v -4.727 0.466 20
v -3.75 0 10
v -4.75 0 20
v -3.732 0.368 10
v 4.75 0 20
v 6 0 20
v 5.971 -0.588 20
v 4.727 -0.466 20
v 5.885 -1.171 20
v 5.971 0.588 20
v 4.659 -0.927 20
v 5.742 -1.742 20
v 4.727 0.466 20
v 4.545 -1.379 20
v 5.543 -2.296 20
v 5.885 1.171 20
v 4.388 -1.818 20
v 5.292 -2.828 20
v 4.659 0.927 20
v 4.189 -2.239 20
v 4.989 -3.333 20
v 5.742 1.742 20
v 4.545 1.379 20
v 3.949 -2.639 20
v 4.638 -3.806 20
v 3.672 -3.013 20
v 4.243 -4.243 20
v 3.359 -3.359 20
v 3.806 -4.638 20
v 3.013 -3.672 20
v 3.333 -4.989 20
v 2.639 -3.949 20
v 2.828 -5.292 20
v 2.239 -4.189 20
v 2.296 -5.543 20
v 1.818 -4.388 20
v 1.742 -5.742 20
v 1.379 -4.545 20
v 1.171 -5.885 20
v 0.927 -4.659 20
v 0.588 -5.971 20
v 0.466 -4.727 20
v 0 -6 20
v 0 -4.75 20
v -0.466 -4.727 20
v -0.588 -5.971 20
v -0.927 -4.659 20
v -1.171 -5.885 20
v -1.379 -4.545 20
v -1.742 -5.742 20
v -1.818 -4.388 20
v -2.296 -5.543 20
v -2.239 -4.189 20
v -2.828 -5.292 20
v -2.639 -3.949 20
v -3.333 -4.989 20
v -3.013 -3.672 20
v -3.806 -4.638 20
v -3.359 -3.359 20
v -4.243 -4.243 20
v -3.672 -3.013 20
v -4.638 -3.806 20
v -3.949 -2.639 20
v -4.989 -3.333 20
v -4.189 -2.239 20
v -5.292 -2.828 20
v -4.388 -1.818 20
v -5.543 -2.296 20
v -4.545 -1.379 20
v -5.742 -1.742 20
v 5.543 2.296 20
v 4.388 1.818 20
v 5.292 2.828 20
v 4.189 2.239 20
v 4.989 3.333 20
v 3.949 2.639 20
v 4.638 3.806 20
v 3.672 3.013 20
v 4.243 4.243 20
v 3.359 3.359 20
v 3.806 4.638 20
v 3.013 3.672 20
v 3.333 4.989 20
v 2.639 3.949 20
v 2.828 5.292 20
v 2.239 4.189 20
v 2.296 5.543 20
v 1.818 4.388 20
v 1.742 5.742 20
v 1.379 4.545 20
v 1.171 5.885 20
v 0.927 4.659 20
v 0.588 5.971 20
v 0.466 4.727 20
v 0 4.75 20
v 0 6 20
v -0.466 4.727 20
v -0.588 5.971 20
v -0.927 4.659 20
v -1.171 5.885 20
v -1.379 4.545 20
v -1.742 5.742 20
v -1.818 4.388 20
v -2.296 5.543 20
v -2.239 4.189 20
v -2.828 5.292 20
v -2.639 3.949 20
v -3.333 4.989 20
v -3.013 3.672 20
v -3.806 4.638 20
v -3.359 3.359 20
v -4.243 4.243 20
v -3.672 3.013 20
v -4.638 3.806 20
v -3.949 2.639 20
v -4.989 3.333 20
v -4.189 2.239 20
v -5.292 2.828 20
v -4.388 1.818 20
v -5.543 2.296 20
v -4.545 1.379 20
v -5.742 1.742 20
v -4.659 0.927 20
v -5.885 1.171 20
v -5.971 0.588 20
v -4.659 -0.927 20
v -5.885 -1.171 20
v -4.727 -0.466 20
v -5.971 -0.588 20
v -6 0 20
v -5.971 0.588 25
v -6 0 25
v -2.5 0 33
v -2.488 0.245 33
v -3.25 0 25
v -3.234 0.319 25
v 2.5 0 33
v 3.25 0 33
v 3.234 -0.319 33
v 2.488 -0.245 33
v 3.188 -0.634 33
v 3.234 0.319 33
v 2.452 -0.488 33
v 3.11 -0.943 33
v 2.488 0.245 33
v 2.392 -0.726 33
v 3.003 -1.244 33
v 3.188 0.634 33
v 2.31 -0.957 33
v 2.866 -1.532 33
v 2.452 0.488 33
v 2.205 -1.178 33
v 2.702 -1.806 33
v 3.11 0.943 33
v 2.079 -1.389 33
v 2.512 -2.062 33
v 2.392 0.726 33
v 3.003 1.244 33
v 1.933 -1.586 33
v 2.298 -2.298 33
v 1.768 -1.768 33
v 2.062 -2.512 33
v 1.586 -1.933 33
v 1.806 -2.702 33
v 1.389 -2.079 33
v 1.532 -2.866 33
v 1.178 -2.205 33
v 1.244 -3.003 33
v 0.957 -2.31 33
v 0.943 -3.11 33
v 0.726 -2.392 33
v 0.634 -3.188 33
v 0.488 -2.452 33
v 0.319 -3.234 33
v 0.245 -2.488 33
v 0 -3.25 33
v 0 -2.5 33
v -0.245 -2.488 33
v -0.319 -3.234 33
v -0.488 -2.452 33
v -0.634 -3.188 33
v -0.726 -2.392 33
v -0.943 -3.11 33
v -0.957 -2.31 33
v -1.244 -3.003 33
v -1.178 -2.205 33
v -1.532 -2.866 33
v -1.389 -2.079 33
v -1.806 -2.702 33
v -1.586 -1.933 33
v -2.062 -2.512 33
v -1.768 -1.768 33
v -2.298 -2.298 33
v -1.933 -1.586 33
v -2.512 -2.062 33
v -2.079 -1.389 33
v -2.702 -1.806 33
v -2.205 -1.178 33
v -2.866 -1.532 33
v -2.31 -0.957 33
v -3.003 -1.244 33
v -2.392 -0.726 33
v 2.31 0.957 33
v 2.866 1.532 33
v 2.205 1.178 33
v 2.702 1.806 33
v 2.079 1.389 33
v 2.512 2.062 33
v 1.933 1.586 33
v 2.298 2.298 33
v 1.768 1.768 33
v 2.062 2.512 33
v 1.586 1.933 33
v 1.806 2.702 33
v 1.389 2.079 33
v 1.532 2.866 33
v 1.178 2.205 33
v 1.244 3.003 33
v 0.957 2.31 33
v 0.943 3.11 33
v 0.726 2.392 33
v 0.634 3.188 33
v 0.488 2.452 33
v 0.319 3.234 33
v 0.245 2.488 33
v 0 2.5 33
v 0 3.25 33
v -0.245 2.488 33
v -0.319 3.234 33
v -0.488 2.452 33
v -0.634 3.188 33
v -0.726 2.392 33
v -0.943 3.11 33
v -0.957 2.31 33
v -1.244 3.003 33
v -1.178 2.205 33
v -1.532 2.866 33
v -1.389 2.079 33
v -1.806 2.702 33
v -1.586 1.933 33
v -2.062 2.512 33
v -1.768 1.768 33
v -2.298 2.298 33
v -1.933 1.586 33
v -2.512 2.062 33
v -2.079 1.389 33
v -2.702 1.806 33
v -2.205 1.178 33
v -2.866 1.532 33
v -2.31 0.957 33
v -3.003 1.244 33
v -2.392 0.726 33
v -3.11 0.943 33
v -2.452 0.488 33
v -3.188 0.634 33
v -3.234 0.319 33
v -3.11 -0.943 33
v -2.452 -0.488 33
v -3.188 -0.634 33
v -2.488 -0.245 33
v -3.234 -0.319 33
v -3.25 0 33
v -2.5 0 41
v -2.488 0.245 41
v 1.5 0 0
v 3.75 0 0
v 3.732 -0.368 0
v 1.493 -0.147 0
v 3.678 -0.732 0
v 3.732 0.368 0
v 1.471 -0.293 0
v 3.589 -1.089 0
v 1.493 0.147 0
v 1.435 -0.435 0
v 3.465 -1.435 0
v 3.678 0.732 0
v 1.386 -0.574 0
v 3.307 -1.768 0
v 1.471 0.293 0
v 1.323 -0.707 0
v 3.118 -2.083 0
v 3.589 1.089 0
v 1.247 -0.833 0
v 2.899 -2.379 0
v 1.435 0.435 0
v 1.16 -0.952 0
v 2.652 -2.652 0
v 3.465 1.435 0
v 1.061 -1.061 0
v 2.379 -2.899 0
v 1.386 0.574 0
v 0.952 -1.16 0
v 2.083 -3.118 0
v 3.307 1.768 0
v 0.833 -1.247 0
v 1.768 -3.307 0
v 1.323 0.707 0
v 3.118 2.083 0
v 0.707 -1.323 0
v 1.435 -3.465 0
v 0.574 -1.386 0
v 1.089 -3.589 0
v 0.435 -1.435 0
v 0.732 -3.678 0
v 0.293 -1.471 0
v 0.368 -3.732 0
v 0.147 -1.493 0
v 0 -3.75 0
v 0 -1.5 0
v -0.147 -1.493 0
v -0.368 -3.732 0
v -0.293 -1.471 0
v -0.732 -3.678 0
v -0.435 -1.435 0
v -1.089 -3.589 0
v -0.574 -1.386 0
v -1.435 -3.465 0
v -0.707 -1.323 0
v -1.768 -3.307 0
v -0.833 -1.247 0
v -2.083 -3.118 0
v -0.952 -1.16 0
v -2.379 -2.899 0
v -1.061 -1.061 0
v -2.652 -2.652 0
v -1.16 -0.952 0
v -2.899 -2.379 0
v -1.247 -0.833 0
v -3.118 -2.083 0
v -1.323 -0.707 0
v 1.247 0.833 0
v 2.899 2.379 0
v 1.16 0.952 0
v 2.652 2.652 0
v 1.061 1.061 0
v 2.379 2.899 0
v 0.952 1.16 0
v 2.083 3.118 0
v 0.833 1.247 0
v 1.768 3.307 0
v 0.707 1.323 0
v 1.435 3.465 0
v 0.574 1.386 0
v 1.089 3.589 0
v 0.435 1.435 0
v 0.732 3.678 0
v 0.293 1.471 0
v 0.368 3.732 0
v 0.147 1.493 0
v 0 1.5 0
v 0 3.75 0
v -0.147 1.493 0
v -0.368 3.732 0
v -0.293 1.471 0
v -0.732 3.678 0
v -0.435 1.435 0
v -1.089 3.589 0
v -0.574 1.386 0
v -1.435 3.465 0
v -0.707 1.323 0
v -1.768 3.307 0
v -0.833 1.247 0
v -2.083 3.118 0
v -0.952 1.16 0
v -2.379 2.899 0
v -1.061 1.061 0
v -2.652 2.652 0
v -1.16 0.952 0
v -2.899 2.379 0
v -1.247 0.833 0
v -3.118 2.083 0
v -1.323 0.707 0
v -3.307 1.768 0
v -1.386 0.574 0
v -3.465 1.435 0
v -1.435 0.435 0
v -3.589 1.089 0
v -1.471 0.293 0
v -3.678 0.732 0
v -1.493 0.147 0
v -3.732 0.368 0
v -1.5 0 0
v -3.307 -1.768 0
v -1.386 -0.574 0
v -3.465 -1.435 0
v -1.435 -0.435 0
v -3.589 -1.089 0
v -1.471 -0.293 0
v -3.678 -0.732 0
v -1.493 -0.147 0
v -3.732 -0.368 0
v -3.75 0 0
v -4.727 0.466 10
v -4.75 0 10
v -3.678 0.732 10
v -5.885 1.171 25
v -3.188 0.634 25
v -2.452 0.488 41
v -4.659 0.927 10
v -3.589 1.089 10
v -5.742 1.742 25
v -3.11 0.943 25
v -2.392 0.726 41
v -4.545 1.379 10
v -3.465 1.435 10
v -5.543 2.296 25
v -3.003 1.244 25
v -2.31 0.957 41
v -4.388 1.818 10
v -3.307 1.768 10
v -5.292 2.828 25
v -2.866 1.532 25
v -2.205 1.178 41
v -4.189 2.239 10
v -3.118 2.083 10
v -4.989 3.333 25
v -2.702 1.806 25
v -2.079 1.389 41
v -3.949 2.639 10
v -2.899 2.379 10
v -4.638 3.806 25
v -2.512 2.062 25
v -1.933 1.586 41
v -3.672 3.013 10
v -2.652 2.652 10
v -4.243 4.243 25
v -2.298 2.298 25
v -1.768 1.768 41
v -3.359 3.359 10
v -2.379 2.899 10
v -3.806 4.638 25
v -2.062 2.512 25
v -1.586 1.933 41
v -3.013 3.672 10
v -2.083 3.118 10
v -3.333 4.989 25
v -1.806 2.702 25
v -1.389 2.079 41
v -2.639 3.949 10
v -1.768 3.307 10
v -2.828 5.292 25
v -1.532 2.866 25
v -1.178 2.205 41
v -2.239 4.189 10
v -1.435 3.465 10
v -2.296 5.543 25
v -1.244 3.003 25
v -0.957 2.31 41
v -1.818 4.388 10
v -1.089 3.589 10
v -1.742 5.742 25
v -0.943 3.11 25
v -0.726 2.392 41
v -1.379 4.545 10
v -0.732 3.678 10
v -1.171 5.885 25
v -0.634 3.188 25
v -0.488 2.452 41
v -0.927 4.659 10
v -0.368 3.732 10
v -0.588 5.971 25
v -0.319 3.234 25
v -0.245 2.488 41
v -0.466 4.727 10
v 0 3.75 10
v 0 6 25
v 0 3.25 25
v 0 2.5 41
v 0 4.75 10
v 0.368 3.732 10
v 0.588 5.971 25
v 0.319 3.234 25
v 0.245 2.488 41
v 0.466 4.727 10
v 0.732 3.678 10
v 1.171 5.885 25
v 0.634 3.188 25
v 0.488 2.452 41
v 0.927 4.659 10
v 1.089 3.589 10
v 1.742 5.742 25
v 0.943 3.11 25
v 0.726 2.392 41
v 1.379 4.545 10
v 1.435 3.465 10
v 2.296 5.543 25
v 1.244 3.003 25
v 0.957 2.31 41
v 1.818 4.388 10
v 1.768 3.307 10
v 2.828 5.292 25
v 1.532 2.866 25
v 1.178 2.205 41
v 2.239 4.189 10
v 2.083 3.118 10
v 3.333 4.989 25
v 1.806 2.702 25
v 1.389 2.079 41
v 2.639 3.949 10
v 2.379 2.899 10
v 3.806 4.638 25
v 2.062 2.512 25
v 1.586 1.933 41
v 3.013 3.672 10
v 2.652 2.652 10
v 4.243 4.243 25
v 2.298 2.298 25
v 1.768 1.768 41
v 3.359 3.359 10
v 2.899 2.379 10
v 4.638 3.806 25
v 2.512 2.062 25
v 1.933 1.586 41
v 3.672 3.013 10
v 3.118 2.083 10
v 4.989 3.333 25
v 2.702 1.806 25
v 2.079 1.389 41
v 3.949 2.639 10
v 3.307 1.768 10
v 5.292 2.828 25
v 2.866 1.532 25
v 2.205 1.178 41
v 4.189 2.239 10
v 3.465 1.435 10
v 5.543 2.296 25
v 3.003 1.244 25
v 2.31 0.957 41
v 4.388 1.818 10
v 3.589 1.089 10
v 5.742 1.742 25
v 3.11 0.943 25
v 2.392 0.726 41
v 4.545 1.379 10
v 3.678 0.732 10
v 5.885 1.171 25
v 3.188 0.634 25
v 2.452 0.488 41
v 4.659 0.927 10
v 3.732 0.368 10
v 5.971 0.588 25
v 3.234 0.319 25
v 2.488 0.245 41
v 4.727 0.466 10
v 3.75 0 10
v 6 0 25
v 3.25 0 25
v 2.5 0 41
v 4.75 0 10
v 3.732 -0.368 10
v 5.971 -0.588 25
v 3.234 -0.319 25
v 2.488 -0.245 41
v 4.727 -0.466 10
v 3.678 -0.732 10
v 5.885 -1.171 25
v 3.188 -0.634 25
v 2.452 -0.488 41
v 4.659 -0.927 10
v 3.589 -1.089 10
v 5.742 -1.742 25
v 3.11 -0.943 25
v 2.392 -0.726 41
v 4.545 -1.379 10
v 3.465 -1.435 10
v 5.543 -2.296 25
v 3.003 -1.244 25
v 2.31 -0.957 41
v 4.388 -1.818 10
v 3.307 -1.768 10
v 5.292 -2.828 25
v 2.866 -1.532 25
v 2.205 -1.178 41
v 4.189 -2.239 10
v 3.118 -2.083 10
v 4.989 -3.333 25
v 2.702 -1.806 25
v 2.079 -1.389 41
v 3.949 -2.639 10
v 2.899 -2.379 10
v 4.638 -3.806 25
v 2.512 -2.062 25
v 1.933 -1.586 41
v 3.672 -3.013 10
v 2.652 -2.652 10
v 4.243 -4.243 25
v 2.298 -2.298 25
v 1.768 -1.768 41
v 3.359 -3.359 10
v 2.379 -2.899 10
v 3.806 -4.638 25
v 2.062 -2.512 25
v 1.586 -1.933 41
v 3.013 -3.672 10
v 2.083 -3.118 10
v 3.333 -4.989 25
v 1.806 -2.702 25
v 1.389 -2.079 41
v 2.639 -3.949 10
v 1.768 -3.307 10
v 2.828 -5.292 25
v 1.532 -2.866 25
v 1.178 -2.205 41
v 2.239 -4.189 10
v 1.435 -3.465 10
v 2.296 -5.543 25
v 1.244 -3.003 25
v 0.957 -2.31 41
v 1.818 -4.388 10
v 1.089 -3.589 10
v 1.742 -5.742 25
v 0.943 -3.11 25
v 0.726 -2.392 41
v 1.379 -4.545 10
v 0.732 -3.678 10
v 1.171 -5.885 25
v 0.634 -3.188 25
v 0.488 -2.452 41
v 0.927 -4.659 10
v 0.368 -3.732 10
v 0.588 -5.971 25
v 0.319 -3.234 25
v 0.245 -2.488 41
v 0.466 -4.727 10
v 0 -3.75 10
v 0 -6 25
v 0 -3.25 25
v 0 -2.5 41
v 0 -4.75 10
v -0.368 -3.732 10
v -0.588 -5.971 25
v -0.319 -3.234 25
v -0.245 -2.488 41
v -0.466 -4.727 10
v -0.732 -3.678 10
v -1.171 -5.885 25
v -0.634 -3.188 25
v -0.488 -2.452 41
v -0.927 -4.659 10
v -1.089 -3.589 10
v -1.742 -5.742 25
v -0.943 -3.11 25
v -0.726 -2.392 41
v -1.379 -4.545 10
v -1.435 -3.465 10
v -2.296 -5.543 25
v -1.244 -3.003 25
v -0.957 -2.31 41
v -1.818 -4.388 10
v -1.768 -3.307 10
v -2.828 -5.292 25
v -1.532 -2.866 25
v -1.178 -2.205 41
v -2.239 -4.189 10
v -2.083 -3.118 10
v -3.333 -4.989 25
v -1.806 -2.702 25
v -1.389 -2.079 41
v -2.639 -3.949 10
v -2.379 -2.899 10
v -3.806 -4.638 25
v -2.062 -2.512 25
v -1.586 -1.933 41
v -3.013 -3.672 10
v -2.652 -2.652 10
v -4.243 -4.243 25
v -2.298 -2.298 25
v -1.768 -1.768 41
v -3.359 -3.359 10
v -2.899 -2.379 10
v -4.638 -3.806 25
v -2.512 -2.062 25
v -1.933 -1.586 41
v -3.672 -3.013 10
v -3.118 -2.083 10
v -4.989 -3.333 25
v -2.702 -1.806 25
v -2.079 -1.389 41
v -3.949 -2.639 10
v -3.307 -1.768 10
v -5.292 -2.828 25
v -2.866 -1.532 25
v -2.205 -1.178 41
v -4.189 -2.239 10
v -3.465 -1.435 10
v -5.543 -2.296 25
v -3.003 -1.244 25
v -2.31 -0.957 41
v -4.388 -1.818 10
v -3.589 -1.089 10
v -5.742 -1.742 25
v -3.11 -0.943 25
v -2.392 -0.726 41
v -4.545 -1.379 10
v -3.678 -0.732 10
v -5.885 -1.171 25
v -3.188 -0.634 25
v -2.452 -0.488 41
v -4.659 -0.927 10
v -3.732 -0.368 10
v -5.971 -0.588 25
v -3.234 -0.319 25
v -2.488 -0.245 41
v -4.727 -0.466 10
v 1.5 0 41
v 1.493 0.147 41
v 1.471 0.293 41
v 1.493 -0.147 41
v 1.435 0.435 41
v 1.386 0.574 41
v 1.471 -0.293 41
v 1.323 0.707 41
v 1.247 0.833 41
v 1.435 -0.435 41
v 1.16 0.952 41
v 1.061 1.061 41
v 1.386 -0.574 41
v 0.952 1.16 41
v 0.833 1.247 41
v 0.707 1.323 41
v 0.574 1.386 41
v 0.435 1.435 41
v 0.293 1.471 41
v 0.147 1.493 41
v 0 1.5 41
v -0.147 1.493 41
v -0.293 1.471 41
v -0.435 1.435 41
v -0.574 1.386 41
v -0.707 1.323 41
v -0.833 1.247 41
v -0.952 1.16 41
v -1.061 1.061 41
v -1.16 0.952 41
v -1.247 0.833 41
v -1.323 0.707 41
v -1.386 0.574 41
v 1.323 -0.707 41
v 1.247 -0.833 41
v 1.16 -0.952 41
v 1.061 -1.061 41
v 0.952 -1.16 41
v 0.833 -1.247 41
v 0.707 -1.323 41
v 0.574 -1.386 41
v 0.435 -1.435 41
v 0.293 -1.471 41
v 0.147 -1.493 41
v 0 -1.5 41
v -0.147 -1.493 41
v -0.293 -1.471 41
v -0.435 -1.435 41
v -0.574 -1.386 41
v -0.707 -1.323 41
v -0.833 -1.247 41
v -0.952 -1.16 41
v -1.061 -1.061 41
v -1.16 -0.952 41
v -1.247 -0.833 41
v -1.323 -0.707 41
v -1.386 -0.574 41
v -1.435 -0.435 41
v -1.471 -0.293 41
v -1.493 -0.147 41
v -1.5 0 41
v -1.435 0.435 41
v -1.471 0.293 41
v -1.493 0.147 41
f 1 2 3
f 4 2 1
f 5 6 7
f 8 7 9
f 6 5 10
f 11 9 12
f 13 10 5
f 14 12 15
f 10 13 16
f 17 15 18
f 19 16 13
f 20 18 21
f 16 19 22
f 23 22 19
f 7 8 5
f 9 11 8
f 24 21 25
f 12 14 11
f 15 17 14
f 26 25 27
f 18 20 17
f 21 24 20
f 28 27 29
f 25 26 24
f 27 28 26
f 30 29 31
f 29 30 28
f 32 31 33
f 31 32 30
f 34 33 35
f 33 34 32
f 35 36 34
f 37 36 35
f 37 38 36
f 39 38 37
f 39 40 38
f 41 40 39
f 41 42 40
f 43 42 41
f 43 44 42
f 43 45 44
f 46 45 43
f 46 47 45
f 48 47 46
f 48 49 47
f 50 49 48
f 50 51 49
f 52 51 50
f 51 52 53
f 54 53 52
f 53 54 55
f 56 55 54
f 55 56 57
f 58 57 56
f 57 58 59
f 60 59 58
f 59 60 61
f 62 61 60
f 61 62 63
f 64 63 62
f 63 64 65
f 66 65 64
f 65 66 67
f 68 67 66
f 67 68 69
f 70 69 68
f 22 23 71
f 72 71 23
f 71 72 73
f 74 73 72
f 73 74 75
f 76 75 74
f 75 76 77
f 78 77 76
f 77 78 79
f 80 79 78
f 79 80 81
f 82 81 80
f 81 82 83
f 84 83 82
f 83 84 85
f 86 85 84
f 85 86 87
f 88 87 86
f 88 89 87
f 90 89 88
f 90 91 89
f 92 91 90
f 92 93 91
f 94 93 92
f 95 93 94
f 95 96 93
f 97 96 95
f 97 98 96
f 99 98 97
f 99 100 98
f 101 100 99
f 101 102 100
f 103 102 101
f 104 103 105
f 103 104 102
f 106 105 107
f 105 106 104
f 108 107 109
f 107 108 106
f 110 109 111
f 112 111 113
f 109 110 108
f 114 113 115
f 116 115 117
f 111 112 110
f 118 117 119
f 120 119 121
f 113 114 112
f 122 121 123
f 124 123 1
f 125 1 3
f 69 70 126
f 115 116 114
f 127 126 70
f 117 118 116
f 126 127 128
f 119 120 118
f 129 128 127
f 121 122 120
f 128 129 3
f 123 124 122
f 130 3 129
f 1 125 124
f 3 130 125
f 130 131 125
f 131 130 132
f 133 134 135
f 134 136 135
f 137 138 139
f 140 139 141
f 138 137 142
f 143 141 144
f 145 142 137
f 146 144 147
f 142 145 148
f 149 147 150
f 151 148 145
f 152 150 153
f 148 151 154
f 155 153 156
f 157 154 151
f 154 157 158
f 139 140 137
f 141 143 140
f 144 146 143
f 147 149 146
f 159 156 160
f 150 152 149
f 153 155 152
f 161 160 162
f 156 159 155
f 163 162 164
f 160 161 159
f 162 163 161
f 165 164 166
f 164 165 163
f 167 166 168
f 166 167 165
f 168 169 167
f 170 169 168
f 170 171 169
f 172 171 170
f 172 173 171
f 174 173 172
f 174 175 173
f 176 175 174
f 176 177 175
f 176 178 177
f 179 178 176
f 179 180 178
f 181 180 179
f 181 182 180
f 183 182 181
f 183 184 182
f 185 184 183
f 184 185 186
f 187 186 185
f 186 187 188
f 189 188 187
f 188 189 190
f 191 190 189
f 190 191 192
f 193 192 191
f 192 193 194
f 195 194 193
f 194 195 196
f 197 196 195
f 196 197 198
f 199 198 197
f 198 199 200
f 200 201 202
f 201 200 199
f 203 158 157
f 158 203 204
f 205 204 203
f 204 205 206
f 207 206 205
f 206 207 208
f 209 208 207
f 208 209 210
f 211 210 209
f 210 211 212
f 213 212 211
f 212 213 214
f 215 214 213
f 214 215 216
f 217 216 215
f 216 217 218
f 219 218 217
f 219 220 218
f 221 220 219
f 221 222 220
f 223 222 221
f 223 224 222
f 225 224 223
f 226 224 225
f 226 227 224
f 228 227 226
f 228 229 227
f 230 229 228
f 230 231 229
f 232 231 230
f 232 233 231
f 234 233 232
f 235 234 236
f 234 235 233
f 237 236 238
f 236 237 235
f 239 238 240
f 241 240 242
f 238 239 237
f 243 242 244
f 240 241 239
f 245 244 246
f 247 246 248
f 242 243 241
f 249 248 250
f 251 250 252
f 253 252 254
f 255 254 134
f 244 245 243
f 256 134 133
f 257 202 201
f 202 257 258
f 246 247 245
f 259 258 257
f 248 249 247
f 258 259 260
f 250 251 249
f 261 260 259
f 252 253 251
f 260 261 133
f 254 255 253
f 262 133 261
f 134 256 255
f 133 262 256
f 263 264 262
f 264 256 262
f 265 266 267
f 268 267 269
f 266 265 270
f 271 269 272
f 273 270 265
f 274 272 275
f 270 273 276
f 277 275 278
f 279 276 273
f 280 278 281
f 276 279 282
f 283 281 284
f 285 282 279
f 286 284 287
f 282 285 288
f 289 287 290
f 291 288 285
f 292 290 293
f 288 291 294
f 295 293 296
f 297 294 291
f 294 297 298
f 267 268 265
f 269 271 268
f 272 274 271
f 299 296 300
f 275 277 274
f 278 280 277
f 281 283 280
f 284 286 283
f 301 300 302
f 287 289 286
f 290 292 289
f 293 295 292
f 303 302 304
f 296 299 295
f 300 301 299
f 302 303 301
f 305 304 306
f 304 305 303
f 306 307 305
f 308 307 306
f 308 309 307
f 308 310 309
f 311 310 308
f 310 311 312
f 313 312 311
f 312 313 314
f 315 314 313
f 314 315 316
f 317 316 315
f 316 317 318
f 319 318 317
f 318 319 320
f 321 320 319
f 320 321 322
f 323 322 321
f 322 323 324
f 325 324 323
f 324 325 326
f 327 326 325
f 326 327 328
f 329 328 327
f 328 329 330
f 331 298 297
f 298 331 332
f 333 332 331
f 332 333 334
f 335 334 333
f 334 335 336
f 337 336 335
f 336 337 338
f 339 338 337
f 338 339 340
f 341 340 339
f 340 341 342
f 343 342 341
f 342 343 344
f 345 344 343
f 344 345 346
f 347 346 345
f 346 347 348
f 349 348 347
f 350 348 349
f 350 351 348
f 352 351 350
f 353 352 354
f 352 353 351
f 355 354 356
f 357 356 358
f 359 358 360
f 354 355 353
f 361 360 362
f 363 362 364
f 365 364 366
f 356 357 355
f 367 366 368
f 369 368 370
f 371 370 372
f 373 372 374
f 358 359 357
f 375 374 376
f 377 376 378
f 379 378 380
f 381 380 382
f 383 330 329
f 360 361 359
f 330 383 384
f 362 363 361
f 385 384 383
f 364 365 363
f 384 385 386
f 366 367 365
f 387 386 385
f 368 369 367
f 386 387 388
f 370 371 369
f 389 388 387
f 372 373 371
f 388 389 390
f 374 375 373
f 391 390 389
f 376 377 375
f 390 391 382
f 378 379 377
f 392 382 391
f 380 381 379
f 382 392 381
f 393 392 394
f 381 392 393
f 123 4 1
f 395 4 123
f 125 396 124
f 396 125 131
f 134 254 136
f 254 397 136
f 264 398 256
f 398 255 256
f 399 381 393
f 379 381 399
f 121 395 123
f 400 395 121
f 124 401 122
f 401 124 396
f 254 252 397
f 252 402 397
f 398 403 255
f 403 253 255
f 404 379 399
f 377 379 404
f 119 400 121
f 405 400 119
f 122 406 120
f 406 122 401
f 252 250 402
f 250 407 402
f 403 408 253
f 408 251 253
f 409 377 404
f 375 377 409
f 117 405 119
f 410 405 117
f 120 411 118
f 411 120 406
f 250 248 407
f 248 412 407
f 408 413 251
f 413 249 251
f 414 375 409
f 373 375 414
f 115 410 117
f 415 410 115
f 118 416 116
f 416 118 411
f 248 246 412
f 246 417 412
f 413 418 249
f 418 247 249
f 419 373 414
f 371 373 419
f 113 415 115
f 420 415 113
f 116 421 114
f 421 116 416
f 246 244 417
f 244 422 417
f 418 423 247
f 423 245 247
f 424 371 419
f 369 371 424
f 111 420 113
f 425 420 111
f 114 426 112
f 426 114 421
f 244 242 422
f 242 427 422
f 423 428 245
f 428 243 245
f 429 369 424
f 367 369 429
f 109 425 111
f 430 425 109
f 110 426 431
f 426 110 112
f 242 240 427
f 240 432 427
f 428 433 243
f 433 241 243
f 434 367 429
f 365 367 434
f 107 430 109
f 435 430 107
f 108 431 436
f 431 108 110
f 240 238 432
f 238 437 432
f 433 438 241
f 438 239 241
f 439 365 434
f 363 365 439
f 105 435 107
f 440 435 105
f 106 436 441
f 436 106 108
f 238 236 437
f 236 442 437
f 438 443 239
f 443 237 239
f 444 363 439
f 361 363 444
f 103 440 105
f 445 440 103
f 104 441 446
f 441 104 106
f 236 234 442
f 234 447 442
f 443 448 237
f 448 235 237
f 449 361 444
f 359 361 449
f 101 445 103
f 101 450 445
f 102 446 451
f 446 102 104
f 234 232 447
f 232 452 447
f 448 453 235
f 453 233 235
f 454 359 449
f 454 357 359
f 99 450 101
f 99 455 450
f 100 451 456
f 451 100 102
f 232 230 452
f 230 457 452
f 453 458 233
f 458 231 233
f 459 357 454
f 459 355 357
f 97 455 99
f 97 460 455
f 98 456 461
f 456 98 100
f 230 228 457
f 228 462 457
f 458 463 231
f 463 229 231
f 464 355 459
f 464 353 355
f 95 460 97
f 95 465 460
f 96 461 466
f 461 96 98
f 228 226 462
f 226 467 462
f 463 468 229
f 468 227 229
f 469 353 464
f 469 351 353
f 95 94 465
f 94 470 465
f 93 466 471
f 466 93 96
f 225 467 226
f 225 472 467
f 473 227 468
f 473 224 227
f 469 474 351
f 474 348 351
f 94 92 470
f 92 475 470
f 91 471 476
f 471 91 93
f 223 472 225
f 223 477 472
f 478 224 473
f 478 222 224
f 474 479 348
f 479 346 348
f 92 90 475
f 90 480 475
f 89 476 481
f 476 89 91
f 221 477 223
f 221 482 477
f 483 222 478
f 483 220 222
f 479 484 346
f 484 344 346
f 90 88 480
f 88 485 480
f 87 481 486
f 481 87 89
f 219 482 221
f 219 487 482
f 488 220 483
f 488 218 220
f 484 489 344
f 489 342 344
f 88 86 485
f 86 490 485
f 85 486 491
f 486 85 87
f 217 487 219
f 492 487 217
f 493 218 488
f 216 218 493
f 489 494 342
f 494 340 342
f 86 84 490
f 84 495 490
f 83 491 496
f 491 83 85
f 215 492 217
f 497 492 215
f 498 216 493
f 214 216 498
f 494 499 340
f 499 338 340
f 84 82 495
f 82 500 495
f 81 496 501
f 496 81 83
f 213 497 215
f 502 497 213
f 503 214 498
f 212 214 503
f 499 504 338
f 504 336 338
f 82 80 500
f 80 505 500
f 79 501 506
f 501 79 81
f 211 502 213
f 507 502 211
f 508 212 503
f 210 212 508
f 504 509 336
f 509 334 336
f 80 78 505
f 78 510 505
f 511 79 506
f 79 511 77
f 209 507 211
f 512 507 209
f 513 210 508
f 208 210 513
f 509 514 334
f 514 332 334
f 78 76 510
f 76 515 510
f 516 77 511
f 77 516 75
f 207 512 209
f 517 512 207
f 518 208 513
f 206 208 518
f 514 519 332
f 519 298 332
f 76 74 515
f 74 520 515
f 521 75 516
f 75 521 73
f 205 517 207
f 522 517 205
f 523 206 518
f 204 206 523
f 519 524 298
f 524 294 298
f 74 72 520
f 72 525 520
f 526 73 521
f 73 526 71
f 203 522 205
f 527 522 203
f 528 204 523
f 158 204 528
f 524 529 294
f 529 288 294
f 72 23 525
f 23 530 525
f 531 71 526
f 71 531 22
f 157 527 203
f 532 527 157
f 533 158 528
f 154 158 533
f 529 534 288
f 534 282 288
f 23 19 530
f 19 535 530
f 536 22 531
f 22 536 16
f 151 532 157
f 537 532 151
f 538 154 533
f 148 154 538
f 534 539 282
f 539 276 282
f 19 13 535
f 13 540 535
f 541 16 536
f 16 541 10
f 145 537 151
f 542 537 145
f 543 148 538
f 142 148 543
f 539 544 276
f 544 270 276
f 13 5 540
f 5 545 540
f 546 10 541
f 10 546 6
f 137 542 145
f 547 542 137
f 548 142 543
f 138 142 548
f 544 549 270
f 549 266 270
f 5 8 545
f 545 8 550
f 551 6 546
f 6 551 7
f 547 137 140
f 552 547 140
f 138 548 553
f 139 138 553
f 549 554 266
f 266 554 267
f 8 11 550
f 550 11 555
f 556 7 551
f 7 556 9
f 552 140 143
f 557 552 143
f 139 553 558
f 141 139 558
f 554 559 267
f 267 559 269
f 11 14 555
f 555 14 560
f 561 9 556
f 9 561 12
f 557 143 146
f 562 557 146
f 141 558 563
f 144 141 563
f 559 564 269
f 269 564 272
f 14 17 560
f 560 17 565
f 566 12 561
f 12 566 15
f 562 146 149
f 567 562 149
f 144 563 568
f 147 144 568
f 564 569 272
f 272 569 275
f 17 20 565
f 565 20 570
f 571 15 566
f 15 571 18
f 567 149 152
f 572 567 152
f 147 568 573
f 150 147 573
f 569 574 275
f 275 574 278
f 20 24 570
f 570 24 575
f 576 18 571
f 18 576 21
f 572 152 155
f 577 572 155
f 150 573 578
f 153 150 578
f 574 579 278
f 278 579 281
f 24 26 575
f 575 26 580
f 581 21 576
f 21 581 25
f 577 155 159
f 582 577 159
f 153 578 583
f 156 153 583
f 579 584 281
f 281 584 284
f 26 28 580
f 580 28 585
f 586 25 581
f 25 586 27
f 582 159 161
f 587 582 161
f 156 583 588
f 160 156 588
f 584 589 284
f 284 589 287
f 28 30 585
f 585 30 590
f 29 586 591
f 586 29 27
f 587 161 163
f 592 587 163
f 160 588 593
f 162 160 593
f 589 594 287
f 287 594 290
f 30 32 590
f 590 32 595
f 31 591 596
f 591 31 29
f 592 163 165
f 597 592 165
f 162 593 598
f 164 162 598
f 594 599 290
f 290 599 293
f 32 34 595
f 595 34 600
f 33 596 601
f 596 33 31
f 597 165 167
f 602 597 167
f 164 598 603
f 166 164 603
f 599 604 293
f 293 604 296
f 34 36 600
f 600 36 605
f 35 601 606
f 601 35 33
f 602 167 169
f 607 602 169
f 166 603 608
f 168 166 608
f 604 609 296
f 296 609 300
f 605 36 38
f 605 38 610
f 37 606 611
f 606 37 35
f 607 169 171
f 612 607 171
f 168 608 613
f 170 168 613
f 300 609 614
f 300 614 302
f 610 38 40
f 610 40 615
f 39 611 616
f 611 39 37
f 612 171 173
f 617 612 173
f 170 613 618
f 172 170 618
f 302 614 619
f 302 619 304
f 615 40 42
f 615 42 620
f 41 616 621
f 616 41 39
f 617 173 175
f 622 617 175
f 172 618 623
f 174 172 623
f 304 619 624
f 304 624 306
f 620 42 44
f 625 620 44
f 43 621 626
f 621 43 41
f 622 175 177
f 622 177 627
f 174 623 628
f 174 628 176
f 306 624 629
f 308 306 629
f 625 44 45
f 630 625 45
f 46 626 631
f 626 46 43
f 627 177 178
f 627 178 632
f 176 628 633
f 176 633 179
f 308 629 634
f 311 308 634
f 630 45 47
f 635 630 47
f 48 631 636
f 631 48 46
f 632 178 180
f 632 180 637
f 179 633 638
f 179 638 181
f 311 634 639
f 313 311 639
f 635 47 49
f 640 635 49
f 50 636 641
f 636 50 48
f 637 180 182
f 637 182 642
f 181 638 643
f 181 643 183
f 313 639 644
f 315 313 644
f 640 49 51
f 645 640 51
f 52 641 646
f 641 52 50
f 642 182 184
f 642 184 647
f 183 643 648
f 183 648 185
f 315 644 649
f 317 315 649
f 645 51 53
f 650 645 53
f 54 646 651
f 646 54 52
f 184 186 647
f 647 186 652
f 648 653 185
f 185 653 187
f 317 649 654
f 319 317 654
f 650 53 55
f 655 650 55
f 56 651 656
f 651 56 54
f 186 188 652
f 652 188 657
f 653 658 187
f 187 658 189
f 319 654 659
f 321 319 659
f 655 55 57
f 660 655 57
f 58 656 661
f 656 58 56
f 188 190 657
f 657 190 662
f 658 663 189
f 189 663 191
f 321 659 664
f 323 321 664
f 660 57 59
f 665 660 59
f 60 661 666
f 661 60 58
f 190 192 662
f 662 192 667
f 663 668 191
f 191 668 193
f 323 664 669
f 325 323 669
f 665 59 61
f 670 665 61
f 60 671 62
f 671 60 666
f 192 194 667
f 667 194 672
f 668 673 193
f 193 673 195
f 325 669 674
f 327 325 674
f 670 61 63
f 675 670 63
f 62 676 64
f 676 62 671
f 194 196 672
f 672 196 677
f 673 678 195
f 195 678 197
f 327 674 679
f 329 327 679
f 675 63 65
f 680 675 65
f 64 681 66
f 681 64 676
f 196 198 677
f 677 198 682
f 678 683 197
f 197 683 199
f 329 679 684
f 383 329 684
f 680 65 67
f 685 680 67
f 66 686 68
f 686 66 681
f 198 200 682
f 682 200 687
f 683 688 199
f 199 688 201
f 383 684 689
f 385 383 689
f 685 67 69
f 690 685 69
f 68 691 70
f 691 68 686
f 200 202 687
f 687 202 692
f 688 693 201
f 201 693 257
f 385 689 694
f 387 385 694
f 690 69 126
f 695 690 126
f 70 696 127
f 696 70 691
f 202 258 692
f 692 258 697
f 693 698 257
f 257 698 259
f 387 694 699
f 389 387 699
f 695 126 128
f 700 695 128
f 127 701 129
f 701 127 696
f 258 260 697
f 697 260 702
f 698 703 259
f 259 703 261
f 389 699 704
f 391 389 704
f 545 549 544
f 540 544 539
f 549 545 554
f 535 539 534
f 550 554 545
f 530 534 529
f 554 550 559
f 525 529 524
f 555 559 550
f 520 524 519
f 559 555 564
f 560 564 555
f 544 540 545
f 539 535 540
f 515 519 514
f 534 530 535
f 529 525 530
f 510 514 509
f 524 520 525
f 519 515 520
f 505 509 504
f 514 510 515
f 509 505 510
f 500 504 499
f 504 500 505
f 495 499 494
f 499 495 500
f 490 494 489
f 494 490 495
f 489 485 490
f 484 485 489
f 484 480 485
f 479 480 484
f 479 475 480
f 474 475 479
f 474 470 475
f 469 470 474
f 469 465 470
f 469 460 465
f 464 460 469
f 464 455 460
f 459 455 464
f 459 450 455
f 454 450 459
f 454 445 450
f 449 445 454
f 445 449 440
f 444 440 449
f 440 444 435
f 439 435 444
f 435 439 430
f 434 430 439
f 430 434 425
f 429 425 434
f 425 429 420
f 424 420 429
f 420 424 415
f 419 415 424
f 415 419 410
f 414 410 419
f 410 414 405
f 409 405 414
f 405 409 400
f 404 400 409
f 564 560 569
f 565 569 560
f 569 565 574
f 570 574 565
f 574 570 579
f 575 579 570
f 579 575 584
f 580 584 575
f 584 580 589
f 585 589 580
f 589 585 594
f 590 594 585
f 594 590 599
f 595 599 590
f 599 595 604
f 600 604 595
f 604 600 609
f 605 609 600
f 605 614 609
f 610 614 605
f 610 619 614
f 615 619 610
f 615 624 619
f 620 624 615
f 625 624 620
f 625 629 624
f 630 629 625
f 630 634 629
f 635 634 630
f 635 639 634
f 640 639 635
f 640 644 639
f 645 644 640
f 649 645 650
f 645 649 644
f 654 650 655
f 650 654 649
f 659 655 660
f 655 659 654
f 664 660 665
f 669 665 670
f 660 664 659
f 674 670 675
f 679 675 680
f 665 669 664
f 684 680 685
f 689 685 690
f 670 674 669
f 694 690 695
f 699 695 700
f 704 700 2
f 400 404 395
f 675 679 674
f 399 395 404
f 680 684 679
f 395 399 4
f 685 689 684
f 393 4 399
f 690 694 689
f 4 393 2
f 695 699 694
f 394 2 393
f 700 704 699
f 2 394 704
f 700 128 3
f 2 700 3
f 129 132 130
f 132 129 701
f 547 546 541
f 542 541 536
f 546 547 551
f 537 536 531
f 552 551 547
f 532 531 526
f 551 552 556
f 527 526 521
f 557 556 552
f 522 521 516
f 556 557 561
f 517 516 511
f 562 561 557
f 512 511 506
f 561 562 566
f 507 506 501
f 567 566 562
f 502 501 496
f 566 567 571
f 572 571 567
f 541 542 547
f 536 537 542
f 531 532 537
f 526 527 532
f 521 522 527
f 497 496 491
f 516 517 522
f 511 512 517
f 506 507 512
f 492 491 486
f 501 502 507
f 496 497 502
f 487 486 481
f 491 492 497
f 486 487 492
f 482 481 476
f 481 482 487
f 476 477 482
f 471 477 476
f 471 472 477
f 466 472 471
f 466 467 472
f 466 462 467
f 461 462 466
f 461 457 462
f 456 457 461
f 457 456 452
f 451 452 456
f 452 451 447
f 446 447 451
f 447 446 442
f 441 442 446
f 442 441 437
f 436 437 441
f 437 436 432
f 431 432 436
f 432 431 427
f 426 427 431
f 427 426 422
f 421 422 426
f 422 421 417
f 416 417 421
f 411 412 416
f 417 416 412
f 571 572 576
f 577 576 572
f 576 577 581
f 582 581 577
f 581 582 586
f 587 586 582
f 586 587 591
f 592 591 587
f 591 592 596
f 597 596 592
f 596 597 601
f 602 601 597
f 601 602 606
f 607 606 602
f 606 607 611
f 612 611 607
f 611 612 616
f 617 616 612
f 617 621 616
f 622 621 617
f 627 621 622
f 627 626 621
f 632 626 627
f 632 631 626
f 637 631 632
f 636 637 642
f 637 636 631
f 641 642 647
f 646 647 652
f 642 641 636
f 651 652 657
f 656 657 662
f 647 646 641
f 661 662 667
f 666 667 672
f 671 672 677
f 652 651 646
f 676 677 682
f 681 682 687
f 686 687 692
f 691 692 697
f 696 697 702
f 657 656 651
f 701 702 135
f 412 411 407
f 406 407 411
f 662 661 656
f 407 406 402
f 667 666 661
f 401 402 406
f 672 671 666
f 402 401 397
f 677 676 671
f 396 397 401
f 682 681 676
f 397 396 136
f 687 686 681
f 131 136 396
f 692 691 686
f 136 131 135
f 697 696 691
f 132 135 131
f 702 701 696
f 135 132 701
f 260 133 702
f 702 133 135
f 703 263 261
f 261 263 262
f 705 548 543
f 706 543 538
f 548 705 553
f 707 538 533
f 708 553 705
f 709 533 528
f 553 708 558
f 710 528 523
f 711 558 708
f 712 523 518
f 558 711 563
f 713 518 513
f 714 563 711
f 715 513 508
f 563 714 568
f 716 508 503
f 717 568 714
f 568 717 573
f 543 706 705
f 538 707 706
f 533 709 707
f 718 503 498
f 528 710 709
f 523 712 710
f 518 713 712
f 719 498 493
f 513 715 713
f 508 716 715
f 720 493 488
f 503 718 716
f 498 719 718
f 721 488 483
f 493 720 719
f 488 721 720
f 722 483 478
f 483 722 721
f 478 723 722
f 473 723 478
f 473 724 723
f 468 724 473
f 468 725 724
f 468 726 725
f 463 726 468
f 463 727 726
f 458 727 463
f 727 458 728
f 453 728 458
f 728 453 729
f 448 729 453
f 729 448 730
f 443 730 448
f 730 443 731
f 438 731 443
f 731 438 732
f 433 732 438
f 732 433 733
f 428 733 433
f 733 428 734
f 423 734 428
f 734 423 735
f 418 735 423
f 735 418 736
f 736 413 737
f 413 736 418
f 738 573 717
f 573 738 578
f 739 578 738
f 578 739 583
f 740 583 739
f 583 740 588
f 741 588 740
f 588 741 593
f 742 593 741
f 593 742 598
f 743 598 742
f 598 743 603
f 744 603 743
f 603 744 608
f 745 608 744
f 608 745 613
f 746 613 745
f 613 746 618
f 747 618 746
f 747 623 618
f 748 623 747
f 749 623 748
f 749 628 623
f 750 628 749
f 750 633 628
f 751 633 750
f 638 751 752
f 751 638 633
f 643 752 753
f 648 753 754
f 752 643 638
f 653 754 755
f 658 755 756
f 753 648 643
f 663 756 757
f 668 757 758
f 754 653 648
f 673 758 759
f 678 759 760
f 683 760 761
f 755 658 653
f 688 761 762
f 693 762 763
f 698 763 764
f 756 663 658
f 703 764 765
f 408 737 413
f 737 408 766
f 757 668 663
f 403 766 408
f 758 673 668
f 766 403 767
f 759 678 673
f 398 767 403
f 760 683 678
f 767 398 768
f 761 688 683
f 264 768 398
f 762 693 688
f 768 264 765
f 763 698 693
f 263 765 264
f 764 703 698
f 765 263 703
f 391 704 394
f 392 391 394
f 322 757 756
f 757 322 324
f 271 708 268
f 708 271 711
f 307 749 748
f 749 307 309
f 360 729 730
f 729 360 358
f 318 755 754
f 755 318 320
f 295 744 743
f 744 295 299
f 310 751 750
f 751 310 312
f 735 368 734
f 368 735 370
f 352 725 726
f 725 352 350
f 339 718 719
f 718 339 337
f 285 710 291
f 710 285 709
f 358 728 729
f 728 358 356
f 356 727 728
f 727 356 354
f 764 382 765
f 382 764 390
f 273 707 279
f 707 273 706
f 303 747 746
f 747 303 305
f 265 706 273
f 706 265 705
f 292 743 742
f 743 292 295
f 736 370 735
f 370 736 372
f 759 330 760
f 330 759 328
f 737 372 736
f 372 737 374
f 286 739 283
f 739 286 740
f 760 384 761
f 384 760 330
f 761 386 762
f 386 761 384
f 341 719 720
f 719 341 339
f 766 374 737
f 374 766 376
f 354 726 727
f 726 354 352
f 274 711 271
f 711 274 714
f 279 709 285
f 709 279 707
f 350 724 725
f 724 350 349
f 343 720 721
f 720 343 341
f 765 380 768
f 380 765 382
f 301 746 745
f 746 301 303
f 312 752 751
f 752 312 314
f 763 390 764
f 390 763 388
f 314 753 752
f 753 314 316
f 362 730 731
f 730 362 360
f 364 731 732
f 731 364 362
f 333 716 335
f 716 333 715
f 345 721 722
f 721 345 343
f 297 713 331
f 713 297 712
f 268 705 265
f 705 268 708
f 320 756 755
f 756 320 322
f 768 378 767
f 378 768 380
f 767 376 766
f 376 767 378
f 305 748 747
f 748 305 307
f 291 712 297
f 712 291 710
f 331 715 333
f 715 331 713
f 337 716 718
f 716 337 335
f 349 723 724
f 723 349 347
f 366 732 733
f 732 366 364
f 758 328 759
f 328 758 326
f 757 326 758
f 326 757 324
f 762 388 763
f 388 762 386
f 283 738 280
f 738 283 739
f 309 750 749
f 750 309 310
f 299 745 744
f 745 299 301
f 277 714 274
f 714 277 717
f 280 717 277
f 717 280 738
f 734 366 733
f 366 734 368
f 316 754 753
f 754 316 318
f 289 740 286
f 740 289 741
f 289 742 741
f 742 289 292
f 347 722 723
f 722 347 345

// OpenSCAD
// Hose barb reducer: 8 mm to 5 mm silicone tubing
// Print orientation: standing upright along Z-axis (Z=0 to Z=41)
// Central bore: 3 mm diameter, runs entire length

// Bore dimensions
bore_diameter = 3;
bore_radius = bore_diameter / 2;
bore_height = 41;

// 8 mm tubing barbs (two stacked, each 10 mm tall)
// Outer diameter grows from 7.5 mm to 9.5 mm (linear), then steps back
barb8_od_min = 7.5;
barb8_od_max = 9.5;
barb8_r_min = barb8_od_min / 2;
barb8_r_max = barb8_od_max / 2;
barb8_height = 10;  // per barb

// Transition collar (5 mm tall, 12 mm diameter)
collar_od = 12;
collar_r = collar_od / 2;
collar_height = 5;

// 5 mm tubing barbs (two stacked, each 8 mm tall)
// Outer diameter shrinks from 6.5 mm to 5.0 mm (linear), then steps out
barb5_od_max = 6.5;
barb5_od_min = 5.0;
barb5_r_max = barb5_od_max / 2;
barb5_r_min = barb5_od_min / 2;
barb5_height = 8;  // per barb

difference() {
    // Create outer profile and rotate around Z-axis
    rotate_extrude(angle=360, $fn=64) {
        polygon([
            // Base (center)
            [0, 0],
            
            // First 8mm barb (Z = 0 to 10)
            [barb8_r_min, 0],
            [barb8_r_max, barb8_height],
            [barb8_r_min, barb8_height],
            
            // Second 8mm barb (Z = 10 to 20)
            [barb8_r_max, 2*barb8_height],
            [barb8_r_min, 2*barb8_height],
            
            // Collar (Z = 20 to 25)
            [collar_r, 2*barb8_height],
            [collar_r, 2*barb8_height + collar_height],
            
            // First 5mm barb (Z = 25 to 33)
            [barb5_r_max, 2*barb8_height + collar_height],
            [barb5_r_min, 2*barb8_height + collar_height + barb5_height],
            [barb5_r_max, 2*barb8_height + collar_height + barb5_height],
            
            // Second 5mm barb (Z = 33 to 41)
            [barb5_r_min, 2*barb8_height + collar_height + 2*barb5_height],
            [barb5_r_max, bore_height],
            
            // Top (center)
            [0, bore_height]
        ]);
    }
    
    // Subtract central bore (3 mm diameter)
    cylinder(r=bore_radius, h=bore_height, $fn=64);
}
